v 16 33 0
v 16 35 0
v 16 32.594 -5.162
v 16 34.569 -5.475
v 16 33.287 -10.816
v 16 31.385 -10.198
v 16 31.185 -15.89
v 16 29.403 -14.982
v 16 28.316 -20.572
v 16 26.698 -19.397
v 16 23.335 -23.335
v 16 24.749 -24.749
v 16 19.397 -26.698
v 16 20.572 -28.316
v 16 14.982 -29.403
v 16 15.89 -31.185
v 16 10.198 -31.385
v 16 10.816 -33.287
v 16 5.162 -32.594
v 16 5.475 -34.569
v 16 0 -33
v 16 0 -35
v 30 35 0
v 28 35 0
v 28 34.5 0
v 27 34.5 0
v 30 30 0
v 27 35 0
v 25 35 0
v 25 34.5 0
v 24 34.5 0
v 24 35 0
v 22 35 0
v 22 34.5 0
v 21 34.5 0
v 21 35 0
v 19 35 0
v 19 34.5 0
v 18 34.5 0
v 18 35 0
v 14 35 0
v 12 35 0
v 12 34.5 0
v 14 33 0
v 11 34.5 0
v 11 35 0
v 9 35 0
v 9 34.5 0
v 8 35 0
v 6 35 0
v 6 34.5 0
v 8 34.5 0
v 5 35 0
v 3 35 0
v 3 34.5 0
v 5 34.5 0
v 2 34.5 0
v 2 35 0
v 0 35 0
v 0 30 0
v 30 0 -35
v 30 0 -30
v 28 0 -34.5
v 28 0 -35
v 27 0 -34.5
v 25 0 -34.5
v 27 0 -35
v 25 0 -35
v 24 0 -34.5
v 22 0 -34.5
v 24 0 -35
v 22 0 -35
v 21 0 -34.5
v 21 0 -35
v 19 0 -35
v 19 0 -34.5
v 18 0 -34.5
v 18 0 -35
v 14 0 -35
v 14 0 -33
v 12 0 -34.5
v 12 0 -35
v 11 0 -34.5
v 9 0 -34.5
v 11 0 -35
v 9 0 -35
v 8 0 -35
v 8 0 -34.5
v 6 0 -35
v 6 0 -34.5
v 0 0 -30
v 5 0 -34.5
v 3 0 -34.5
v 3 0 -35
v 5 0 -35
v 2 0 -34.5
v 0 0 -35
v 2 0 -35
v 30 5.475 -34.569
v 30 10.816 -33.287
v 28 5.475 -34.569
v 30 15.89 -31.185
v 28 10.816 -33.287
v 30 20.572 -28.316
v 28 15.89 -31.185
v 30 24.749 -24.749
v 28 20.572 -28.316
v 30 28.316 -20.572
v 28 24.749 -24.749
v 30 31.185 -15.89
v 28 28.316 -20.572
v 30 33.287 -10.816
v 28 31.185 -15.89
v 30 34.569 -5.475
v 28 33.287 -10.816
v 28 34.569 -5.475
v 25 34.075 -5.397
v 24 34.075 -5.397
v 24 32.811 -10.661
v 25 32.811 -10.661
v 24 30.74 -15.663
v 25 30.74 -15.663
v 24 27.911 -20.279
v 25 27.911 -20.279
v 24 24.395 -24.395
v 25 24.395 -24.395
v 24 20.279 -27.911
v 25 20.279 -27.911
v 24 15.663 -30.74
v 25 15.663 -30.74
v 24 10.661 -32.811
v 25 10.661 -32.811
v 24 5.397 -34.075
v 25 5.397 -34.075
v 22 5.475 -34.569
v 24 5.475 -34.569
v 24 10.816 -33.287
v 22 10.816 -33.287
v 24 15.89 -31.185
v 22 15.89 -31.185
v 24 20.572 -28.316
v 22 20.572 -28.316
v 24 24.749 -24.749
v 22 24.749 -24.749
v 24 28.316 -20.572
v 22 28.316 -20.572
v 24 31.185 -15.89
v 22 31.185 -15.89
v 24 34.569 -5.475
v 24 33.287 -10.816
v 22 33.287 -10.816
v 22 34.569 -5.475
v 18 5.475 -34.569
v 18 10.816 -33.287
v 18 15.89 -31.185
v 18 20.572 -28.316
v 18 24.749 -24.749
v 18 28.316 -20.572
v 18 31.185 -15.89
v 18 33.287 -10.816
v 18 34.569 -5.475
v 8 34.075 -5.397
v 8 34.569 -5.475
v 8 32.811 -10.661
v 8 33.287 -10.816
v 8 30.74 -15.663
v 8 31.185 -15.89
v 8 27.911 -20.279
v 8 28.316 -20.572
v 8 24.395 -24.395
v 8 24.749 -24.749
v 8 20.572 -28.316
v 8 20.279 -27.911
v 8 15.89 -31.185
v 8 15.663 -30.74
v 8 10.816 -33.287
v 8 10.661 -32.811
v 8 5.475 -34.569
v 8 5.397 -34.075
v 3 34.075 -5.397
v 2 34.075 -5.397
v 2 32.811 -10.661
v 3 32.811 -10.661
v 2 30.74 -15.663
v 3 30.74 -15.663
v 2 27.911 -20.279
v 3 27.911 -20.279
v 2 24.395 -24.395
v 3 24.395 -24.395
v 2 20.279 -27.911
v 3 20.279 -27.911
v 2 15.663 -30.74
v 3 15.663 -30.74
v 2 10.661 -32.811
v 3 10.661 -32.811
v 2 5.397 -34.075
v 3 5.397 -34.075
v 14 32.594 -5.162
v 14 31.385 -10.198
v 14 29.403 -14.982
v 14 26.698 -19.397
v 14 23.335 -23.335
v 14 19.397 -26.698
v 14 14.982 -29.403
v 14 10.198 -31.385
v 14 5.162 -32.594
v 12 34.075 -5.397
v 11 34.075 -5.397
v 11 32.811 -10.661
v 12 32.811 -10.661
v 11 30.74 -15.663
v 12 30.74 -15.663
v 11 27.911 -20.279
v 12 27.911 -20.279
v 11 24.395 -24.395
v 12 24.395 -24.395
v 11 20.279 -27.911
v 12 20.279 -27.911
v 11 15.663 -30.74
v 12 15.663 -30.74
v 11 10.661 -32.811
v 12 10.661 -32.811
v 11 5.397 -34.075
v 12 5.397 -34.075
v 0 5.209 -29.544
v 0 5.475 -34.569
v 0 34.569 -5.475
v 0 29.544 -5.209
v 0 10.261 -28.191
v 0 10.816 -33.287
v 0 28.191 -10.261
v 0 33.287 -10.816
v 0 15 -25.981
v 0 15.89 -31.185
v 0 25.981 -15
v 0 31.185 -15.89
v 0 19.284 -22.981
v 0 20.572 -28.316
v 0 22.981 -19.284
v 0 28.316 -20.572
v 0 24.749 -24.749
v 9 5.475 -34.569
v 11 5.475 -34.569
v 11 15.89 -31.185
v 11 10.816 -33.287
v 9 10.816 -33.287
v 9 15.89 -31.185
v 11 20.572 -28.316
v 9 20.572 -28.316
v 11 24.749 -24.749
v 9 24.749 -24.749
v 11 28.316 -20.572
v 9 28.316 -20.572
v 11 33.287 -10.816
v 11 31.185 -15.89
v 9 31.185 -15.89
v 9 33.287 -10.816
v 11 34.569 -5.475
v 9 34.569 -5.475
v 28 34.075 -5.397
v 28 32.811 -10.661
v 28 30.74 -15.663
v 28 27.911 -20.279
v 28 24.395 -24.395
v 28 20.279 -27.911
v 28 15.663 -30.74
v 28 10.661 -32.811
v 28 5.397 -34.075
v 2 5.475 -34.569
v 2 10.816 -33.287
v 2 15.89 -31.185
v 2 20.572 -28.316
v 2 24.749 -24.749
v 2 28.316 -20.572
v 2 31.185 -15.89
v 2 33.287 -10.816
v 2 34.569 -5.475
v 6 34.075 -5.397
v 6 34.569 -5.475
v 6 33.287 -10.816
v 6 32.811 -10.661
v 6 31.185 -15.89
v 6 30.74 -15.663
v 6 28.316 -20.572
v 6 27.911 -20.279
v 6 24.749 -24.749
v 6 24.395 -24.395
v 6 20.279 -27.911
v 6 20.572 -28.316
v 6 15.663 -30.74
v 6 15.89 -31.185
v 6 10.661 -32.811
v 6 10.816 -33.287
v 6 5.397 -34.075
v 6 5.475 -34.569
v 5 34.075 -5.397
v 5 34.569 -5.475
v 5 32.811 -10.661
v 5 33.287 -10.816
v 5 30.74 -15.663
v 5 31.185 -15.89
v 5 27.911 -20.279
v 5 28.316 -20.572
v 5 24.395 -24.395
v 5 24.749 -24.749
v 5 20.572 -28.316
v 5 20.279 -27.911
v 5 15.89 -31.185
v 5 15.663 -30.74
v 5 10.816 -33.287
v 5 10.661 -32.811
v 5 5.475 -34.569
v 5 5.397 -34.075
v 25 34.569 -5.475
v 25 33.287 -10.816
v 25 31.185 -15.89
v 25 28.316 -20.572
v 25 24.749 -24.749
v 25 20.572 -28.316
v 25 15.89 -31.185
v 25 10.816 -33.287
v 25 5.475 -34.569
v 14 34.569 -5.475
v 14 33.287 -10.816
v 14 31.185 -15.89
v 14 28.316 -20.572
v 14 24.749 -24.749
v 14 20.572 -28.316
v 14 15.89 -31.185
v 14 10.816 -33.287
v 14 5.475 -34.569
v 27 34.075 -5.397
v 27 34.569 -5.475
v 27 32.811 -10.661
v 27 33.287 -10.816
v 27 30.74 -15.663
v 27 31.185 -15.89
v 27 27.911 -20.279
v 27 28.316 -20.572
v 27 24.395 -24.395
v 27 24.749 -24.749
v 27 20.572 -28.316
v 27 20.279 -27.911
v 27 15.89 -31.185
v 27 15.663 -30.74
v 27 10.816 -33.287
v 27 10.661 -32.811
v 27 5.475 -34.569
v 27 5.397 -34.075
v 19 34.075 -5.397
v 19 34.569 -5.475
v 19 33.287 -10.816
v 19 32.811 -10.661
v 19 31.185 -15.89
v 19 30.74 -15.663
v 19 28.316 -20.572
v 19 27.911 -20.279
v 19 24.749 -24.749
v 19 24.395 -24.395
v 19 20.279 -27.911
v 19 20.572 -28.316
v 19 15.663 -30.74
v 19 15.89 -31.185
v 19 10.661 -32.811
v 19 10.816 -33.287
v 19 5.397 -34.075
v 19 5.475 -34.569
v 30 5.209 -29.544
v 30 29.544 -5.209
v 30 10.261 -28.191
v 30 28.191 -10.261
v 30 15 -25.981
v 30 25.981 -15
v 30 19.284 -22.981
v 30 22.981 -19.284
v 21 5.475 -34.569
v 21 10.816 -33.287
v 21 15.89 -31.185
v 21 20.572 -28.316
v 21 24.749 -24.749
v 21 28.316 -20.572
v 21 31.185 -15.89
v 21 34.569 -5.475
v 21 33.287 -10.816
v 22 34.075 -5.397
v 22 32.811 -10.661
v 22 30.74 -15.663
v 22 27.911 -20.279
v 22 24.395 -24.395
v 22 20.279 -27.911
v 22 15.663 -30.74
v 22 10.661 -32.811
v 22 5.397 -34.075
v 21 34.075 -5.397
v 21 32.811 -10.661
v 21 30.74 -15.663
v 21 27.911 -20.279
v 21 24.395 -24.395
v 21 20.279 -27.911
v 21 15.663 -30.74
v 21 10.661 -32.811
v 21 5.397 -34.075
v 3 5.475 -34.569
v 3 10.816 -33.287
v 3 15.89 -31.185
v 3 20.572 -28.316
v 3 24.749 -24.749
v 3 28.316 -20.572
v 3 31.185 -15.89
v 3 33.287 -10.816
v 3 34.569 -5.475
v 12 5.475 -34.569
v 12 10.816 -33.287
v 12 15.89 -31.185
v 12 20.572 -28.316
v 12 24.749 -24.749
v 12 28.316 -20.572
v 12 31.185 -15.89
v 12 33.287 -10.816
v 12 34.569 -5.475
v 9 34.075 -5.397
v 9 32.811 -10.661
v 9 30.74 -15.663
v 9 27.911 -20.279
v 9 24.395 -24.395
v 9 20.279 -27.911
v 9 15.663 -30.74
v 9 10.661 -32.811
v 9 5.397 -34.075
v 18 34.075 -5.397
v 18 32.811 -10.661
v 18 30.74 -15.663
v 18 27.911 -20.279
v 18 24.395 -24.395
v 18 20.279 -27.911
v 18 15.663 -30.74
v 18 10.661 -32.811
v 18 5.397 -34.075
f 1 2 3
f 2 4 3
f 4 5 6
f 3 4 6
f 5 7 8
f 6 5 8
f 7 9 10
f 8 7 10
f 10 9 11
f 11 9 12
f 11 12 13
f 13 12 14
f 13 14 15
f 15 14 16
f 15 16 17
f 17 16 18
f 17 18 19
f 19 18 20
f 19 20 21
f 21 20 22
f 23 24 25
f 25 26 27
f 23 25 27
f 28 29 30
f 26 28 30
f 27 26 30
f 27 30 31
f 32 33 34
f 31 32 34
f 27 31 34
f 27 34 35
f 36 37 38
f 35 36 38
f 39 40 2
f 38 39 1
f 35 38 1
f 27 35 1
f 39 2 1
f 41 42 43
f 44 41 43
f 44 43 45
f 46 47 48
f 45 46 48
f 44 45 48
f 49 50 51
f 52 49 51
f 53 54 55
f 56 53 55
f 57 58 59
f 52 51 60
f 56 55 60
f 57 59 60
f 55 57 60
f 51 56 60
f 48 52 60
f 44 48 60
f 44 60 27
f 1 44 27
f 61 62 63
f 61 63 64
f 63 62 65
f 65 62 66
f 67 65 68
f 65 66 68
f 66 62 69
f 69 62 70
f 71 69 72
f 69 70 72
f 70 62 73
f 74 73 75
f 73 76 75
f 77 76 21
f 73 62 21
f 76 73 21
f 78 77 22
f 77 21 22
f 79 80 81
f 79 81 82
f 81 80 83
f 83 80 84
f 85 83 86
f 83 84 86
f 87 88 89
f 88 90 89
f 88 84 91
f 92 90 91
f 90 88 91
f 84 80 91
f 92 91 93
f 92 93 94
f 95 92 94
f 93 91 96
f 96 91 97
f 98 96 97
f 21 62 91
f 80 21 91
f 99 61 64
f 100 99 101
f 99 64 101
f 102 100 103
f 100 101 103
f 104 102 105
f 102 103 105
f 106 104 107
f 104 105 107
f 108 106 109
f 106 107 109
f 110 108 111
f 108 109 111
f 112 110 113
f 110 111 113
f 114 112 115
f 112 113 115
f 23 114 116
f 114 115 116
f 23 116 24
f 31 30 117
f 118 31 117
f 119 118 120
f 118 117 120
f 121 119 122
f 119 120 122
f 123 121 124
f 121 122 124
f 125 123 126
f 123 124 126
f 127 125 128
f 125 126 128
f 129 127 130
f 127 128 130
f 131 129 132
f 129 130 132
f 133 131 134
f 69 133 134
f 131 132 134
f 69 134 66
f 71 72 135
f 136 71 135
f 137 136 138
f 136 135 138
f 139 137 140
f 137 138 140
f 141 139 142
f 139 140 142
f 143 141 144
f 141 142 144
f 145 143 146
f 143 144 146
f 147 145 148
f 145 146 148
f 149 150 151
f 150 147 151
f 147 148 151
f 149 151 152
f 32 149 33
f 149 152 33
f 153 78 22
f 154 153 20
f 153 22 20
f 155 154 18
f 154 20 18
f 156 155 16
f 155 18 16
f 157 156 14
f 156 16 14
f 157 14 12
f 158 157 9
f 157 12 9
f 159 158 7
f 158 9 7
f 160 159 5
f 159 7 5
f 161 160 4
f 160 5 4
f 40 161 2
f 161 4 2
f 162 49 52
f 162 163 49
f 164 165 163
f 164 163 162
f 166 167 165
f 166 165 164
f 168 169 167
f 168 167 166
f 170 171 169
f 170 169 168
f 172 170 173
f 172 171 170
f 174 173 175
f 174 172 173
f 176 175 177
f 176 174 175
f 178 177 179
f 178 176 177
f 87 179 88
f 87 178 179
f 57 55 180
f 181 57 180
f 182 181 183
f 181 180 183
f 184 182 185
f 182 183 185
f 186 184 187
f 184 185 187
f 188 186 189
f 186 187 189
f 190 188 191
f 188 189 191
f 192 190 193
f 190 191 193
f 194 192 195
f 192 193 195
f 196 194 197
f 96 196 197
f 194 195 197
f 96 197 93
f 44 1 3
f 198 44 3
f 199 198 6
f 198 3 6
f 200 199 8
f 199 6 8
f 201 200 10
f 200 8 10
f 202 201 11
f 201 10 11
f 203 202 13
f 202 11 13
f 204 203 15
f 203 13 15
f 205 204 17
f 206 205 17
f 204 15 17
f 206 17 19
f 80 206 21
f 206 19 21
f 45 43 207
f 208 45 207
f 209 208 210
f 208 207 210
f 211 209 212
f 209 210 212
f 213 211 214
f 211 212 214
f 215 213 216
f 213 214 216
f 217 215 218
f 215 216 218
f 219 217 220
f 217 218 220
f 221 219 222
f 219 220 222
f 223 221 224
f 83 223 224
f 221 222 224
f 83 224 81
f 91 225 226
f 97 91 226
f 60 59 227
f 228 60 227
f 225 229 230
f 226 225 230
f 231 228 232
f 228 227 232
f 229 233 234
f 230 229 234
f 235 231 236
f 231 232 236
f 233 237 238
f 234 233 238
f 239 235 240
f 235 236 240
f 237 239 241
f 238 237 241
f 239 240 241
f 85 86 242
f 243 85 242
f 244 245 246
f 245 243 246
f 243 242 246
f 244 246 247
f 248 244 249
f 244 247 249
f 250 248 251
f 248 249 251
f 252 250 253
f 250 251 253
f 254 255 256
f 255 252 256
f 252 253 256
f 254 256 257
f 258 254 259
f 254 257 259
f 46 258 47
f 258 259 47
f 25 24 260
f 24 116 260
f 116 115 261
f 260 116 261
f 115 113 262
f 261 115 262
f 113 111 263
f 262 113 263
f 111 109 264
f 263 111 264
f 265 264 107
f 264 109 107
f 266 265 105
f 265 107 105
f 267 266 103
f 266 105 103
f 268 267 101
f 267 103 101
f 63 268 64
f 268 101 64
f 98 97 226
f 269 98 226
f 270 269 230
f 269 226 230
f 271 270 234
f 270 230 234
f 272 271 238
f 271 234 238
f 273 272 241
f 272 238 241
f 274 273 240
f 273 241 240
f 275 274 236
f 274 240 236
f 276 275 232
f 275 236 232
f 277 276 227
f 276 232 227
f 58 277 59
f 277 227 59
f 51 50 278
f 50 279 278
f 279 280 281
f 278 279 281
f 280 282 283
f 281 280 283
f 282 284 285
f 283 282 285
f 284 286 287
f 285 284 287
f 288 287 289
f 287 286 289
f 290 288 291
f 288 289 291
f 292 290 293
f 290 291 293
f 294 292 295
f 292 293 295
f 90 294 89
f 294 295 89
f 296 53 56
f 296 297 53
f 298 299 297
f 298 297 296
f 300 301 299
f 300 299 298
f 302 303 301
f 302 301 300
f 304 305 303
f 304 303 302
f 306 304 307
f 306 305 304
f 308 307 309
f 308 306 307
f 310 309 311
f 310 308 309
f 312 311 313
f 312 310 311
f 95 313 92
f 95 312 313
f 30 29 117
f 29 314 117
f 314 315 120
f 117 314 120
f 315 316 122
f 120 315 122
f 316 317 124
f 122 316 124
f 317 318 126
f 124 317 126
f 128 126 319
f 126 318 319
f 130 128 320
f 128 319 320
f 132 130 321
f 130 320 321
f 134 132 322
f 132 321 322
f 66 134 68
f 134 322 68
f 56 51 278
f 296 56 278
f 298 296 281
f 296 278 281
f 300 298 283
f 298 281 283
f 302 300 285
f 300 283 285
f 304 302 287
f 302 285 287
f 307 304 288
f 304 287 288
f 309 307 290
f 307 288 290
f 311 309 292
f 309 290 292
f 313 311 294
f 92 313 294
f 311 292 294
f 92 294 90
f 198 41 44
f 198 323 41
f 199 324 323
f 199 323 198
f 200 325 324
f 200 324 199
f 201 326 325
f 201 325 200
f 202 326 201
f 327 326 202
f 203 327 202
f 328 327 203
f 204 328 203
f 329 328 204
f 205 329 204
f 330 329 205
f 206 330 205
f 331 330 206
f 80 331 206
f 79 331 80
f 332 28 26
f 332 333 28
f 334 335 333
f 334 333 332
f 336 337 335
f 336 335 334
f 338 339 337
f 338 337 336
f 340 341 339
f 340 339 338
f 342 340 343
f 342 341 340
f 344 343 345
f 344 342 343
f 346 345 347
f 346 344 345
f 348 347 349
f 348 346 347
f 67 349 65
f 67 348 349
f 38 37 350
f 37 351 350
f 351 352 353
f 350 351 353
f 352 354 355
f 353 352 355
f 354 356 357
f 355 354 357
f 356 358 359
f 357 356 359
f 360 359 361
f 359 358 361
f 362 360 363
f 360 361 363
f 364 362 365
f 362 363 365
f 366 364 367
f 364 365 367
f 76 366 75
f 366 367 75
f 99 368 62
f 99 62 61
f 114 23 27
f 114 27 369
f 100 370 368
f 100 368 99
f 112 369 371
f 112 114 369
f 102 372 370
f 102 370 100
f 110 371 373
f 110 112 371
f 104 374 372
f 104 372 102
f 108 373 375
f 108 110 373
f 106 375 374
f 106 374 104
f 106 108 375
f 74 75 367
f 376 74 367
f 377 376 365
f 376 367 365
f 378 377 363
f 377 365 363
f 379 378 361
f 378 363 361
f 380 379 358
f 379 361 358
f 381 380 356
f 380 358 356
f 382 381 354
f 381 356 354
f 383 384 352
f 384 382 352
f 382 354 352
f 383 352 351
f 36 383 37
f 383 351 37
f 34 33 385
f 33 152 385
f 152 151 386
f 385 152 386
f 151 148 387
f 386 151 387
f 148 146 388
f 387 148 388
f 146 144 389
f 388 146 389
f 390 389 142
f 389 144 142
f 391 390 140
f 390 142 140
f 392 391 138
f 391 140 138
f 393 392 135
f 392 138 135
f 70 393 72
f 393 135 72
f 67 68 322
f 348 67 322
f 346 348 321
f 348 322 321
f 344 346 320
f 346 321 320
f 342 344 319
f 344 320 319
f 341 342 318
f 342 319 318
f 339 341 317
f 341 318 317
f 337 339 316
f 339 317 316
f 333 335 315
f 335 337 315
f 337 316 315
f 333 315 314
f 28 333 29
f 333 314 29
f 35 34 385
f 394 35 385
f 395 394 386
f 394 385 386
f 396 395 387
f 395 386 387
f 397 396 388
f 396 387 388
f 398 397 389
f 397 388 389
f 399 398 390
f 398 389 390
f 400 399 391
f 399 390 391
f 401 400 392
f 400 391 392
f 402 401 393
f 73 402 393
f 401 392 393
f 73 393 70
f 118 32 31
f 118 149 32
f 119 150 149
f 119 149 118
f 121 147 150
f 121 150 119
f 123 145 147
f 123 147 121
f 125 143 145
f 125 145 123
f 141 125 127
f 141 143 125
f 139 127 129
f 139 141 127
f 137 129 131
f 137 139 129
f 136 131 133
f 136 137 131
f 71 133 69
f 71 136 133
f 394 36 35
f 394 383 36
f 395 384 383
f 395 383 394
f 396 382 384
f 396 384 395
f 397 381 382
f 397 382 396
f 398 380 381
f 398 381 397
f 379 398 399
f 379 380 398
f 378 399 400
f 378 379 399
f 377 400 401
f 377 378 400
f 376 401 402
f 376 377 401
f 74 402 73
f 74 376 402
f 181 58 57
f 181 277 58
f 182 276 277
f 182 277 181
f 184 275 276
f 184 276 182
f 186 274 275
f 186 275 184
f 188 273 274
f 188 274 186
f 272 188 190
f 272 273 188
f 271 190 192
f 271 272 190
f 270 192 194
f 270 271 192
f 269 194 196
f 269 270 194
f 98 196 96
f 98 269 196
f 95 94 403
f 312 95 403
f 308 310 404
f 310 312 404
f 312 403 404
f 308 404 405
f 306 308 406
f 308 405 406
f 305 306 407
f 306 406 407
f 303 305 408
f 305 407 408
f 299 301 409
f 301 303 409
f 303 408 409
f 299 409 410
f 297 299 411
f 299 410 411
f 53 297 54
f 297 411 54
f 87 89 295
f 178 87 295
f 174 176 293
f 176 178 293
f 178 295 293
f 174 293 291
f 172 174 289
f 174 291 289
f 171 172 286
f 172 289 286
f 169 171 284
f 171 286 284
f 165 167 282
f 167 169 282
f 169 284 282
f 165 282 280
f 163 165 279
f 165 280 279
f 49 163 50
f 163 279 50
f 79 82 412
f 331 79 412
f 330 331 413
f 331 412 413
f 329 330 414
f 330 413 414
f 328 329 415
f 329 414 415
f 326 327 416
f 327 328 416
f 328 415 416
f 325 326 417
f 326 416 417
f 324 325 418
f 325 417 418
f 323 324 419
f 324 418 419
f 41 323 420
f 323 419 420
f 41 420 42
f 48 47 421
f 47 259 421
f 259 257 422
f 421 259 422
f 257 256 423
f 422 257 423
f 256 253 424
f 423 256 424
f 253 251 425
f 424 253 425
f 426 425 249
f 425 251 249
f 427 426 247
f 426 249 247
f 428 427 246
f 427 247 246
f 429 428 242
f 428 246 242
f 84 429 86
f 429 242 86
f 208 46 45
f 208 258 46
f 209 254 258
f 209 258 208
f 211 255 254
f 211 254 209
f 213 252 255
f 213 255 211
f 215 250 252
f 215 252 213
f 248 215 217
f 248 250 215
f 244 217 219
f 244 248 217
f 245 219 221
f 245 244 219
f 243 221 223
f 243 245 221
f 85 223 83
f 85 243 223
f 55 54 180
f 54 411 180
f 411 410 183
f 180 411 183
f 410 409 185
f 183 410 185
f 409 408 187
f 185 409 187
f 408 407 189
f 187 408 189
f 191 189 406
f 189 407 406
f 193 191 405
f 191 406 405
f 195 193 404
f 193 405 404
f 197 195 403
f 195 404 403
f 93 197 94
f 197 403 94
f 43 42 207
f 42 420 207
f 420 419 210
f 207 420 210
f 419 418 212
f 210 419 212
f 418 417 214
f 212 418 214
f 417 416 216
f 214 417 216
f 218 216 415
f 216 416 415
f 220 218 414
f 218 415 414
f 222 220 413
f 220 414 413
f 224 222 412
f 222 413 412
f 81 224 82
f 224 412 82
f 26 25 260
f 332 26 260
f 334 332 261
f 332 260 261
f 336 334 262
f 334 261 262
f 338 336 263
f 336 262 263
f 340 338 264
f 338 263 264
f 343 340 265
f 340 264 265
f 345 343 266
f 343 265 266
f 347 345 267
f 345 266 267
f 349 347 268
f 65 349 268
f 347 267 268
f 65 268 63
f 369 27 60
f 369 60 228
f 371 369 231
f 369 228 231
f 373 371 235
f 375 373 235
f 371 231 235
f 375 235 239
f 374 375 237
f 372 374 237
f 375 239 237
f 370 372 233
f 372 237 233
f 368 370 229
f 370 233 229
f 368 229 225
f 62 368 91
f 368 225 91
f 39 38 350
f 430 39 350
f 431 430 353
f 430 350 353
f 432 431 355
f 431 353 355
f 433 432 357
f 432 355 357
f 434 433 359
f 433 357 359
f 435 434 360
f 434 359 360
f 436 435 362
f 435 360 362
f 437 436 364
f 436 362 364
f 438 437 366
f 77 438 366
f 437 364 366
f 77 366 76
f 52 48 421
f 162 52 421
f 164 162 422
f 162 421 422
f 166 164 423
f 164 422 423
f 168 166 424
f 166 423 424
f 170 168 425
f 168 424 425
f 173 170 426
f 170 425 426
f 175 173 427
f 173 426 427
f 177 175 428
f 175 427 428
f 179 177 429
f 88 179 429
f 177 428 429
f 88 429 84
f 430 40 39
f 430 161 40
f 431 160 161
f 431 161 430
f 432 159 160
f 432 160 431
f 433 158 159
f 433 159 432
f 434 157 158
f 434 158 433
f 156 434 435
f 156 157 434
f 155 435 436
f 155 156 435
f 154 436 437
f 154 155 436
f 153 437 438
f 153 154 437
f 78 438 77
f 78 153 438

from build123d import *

# Parameters (mm, degrees)
BOSS_EXTRUDE1_DEPTH = 30
SKETCH2_W           = 1
SKETCH2_H           = 1
SKETCH2_W_2         = 2
SKETCH2_H_2         = 2


with BuildPart() as part:
    # Sketch1 → Boss-Extrude1 (new body)
    with BuildSketch(Plane(origin=(0, 0, 0), x_dir=(0, 0, -1), z_dir=(1, 0, 0))):
        with BuildLine():
            Line((0, 35), (0, 30))
            ThreePointArc((0, 30), (21.213203436, 21.213203436), (30, 0))
            Line((30, 0), (35, 0))
            ThreePointArc((35, 0), (24.748737342, 24.748737342), (0, 35))
        make_face()
    extrude(amount=BOSS_EXTRUDE1_DEPTH)

    # Sketch2 → Cut-Revolve1 (revolve, cut)
    with BuildSketch(Plane.XY):
        with Locations((2.5, 35)):
            Rectangle(SKETCH2_W, SKETCH2_H)
        with Locations((5.5, 35)):
            Rectangle(SKETCH2_W, SKETCH2_H)
        with Locations((8.5, 35)):
            Rectangle(SKETCH2_W, SKETCH2_H)
        with Locations((11.5, 35)):
            Rectangle(SKETCH2_W, SKETCH2_H)
        with Locations((18.5, 35)):
            Rectangle(SKETCH2_W, SKETCH2_H)
        with Locations((21.5, 35)):
            Rectangle(SKETCH2_W, SKETCH2_H)
        with Locations((24.5, 35)):
            Rectangle(SKETCH2_W, SKETCH2_H)
        with Locations((27.5, 35)):
            Rectangle(SKETCH2_W, SKETCH2_H)
        with Locations((15, 34)):
            Rectangle(SKETCH2_W_2, SKETCH2_H_2)
    revolve(axis=Axis((30, 0, 0), (-1, 0, 0)), mode=Mode.SUBTRACT)


solid = part.part
